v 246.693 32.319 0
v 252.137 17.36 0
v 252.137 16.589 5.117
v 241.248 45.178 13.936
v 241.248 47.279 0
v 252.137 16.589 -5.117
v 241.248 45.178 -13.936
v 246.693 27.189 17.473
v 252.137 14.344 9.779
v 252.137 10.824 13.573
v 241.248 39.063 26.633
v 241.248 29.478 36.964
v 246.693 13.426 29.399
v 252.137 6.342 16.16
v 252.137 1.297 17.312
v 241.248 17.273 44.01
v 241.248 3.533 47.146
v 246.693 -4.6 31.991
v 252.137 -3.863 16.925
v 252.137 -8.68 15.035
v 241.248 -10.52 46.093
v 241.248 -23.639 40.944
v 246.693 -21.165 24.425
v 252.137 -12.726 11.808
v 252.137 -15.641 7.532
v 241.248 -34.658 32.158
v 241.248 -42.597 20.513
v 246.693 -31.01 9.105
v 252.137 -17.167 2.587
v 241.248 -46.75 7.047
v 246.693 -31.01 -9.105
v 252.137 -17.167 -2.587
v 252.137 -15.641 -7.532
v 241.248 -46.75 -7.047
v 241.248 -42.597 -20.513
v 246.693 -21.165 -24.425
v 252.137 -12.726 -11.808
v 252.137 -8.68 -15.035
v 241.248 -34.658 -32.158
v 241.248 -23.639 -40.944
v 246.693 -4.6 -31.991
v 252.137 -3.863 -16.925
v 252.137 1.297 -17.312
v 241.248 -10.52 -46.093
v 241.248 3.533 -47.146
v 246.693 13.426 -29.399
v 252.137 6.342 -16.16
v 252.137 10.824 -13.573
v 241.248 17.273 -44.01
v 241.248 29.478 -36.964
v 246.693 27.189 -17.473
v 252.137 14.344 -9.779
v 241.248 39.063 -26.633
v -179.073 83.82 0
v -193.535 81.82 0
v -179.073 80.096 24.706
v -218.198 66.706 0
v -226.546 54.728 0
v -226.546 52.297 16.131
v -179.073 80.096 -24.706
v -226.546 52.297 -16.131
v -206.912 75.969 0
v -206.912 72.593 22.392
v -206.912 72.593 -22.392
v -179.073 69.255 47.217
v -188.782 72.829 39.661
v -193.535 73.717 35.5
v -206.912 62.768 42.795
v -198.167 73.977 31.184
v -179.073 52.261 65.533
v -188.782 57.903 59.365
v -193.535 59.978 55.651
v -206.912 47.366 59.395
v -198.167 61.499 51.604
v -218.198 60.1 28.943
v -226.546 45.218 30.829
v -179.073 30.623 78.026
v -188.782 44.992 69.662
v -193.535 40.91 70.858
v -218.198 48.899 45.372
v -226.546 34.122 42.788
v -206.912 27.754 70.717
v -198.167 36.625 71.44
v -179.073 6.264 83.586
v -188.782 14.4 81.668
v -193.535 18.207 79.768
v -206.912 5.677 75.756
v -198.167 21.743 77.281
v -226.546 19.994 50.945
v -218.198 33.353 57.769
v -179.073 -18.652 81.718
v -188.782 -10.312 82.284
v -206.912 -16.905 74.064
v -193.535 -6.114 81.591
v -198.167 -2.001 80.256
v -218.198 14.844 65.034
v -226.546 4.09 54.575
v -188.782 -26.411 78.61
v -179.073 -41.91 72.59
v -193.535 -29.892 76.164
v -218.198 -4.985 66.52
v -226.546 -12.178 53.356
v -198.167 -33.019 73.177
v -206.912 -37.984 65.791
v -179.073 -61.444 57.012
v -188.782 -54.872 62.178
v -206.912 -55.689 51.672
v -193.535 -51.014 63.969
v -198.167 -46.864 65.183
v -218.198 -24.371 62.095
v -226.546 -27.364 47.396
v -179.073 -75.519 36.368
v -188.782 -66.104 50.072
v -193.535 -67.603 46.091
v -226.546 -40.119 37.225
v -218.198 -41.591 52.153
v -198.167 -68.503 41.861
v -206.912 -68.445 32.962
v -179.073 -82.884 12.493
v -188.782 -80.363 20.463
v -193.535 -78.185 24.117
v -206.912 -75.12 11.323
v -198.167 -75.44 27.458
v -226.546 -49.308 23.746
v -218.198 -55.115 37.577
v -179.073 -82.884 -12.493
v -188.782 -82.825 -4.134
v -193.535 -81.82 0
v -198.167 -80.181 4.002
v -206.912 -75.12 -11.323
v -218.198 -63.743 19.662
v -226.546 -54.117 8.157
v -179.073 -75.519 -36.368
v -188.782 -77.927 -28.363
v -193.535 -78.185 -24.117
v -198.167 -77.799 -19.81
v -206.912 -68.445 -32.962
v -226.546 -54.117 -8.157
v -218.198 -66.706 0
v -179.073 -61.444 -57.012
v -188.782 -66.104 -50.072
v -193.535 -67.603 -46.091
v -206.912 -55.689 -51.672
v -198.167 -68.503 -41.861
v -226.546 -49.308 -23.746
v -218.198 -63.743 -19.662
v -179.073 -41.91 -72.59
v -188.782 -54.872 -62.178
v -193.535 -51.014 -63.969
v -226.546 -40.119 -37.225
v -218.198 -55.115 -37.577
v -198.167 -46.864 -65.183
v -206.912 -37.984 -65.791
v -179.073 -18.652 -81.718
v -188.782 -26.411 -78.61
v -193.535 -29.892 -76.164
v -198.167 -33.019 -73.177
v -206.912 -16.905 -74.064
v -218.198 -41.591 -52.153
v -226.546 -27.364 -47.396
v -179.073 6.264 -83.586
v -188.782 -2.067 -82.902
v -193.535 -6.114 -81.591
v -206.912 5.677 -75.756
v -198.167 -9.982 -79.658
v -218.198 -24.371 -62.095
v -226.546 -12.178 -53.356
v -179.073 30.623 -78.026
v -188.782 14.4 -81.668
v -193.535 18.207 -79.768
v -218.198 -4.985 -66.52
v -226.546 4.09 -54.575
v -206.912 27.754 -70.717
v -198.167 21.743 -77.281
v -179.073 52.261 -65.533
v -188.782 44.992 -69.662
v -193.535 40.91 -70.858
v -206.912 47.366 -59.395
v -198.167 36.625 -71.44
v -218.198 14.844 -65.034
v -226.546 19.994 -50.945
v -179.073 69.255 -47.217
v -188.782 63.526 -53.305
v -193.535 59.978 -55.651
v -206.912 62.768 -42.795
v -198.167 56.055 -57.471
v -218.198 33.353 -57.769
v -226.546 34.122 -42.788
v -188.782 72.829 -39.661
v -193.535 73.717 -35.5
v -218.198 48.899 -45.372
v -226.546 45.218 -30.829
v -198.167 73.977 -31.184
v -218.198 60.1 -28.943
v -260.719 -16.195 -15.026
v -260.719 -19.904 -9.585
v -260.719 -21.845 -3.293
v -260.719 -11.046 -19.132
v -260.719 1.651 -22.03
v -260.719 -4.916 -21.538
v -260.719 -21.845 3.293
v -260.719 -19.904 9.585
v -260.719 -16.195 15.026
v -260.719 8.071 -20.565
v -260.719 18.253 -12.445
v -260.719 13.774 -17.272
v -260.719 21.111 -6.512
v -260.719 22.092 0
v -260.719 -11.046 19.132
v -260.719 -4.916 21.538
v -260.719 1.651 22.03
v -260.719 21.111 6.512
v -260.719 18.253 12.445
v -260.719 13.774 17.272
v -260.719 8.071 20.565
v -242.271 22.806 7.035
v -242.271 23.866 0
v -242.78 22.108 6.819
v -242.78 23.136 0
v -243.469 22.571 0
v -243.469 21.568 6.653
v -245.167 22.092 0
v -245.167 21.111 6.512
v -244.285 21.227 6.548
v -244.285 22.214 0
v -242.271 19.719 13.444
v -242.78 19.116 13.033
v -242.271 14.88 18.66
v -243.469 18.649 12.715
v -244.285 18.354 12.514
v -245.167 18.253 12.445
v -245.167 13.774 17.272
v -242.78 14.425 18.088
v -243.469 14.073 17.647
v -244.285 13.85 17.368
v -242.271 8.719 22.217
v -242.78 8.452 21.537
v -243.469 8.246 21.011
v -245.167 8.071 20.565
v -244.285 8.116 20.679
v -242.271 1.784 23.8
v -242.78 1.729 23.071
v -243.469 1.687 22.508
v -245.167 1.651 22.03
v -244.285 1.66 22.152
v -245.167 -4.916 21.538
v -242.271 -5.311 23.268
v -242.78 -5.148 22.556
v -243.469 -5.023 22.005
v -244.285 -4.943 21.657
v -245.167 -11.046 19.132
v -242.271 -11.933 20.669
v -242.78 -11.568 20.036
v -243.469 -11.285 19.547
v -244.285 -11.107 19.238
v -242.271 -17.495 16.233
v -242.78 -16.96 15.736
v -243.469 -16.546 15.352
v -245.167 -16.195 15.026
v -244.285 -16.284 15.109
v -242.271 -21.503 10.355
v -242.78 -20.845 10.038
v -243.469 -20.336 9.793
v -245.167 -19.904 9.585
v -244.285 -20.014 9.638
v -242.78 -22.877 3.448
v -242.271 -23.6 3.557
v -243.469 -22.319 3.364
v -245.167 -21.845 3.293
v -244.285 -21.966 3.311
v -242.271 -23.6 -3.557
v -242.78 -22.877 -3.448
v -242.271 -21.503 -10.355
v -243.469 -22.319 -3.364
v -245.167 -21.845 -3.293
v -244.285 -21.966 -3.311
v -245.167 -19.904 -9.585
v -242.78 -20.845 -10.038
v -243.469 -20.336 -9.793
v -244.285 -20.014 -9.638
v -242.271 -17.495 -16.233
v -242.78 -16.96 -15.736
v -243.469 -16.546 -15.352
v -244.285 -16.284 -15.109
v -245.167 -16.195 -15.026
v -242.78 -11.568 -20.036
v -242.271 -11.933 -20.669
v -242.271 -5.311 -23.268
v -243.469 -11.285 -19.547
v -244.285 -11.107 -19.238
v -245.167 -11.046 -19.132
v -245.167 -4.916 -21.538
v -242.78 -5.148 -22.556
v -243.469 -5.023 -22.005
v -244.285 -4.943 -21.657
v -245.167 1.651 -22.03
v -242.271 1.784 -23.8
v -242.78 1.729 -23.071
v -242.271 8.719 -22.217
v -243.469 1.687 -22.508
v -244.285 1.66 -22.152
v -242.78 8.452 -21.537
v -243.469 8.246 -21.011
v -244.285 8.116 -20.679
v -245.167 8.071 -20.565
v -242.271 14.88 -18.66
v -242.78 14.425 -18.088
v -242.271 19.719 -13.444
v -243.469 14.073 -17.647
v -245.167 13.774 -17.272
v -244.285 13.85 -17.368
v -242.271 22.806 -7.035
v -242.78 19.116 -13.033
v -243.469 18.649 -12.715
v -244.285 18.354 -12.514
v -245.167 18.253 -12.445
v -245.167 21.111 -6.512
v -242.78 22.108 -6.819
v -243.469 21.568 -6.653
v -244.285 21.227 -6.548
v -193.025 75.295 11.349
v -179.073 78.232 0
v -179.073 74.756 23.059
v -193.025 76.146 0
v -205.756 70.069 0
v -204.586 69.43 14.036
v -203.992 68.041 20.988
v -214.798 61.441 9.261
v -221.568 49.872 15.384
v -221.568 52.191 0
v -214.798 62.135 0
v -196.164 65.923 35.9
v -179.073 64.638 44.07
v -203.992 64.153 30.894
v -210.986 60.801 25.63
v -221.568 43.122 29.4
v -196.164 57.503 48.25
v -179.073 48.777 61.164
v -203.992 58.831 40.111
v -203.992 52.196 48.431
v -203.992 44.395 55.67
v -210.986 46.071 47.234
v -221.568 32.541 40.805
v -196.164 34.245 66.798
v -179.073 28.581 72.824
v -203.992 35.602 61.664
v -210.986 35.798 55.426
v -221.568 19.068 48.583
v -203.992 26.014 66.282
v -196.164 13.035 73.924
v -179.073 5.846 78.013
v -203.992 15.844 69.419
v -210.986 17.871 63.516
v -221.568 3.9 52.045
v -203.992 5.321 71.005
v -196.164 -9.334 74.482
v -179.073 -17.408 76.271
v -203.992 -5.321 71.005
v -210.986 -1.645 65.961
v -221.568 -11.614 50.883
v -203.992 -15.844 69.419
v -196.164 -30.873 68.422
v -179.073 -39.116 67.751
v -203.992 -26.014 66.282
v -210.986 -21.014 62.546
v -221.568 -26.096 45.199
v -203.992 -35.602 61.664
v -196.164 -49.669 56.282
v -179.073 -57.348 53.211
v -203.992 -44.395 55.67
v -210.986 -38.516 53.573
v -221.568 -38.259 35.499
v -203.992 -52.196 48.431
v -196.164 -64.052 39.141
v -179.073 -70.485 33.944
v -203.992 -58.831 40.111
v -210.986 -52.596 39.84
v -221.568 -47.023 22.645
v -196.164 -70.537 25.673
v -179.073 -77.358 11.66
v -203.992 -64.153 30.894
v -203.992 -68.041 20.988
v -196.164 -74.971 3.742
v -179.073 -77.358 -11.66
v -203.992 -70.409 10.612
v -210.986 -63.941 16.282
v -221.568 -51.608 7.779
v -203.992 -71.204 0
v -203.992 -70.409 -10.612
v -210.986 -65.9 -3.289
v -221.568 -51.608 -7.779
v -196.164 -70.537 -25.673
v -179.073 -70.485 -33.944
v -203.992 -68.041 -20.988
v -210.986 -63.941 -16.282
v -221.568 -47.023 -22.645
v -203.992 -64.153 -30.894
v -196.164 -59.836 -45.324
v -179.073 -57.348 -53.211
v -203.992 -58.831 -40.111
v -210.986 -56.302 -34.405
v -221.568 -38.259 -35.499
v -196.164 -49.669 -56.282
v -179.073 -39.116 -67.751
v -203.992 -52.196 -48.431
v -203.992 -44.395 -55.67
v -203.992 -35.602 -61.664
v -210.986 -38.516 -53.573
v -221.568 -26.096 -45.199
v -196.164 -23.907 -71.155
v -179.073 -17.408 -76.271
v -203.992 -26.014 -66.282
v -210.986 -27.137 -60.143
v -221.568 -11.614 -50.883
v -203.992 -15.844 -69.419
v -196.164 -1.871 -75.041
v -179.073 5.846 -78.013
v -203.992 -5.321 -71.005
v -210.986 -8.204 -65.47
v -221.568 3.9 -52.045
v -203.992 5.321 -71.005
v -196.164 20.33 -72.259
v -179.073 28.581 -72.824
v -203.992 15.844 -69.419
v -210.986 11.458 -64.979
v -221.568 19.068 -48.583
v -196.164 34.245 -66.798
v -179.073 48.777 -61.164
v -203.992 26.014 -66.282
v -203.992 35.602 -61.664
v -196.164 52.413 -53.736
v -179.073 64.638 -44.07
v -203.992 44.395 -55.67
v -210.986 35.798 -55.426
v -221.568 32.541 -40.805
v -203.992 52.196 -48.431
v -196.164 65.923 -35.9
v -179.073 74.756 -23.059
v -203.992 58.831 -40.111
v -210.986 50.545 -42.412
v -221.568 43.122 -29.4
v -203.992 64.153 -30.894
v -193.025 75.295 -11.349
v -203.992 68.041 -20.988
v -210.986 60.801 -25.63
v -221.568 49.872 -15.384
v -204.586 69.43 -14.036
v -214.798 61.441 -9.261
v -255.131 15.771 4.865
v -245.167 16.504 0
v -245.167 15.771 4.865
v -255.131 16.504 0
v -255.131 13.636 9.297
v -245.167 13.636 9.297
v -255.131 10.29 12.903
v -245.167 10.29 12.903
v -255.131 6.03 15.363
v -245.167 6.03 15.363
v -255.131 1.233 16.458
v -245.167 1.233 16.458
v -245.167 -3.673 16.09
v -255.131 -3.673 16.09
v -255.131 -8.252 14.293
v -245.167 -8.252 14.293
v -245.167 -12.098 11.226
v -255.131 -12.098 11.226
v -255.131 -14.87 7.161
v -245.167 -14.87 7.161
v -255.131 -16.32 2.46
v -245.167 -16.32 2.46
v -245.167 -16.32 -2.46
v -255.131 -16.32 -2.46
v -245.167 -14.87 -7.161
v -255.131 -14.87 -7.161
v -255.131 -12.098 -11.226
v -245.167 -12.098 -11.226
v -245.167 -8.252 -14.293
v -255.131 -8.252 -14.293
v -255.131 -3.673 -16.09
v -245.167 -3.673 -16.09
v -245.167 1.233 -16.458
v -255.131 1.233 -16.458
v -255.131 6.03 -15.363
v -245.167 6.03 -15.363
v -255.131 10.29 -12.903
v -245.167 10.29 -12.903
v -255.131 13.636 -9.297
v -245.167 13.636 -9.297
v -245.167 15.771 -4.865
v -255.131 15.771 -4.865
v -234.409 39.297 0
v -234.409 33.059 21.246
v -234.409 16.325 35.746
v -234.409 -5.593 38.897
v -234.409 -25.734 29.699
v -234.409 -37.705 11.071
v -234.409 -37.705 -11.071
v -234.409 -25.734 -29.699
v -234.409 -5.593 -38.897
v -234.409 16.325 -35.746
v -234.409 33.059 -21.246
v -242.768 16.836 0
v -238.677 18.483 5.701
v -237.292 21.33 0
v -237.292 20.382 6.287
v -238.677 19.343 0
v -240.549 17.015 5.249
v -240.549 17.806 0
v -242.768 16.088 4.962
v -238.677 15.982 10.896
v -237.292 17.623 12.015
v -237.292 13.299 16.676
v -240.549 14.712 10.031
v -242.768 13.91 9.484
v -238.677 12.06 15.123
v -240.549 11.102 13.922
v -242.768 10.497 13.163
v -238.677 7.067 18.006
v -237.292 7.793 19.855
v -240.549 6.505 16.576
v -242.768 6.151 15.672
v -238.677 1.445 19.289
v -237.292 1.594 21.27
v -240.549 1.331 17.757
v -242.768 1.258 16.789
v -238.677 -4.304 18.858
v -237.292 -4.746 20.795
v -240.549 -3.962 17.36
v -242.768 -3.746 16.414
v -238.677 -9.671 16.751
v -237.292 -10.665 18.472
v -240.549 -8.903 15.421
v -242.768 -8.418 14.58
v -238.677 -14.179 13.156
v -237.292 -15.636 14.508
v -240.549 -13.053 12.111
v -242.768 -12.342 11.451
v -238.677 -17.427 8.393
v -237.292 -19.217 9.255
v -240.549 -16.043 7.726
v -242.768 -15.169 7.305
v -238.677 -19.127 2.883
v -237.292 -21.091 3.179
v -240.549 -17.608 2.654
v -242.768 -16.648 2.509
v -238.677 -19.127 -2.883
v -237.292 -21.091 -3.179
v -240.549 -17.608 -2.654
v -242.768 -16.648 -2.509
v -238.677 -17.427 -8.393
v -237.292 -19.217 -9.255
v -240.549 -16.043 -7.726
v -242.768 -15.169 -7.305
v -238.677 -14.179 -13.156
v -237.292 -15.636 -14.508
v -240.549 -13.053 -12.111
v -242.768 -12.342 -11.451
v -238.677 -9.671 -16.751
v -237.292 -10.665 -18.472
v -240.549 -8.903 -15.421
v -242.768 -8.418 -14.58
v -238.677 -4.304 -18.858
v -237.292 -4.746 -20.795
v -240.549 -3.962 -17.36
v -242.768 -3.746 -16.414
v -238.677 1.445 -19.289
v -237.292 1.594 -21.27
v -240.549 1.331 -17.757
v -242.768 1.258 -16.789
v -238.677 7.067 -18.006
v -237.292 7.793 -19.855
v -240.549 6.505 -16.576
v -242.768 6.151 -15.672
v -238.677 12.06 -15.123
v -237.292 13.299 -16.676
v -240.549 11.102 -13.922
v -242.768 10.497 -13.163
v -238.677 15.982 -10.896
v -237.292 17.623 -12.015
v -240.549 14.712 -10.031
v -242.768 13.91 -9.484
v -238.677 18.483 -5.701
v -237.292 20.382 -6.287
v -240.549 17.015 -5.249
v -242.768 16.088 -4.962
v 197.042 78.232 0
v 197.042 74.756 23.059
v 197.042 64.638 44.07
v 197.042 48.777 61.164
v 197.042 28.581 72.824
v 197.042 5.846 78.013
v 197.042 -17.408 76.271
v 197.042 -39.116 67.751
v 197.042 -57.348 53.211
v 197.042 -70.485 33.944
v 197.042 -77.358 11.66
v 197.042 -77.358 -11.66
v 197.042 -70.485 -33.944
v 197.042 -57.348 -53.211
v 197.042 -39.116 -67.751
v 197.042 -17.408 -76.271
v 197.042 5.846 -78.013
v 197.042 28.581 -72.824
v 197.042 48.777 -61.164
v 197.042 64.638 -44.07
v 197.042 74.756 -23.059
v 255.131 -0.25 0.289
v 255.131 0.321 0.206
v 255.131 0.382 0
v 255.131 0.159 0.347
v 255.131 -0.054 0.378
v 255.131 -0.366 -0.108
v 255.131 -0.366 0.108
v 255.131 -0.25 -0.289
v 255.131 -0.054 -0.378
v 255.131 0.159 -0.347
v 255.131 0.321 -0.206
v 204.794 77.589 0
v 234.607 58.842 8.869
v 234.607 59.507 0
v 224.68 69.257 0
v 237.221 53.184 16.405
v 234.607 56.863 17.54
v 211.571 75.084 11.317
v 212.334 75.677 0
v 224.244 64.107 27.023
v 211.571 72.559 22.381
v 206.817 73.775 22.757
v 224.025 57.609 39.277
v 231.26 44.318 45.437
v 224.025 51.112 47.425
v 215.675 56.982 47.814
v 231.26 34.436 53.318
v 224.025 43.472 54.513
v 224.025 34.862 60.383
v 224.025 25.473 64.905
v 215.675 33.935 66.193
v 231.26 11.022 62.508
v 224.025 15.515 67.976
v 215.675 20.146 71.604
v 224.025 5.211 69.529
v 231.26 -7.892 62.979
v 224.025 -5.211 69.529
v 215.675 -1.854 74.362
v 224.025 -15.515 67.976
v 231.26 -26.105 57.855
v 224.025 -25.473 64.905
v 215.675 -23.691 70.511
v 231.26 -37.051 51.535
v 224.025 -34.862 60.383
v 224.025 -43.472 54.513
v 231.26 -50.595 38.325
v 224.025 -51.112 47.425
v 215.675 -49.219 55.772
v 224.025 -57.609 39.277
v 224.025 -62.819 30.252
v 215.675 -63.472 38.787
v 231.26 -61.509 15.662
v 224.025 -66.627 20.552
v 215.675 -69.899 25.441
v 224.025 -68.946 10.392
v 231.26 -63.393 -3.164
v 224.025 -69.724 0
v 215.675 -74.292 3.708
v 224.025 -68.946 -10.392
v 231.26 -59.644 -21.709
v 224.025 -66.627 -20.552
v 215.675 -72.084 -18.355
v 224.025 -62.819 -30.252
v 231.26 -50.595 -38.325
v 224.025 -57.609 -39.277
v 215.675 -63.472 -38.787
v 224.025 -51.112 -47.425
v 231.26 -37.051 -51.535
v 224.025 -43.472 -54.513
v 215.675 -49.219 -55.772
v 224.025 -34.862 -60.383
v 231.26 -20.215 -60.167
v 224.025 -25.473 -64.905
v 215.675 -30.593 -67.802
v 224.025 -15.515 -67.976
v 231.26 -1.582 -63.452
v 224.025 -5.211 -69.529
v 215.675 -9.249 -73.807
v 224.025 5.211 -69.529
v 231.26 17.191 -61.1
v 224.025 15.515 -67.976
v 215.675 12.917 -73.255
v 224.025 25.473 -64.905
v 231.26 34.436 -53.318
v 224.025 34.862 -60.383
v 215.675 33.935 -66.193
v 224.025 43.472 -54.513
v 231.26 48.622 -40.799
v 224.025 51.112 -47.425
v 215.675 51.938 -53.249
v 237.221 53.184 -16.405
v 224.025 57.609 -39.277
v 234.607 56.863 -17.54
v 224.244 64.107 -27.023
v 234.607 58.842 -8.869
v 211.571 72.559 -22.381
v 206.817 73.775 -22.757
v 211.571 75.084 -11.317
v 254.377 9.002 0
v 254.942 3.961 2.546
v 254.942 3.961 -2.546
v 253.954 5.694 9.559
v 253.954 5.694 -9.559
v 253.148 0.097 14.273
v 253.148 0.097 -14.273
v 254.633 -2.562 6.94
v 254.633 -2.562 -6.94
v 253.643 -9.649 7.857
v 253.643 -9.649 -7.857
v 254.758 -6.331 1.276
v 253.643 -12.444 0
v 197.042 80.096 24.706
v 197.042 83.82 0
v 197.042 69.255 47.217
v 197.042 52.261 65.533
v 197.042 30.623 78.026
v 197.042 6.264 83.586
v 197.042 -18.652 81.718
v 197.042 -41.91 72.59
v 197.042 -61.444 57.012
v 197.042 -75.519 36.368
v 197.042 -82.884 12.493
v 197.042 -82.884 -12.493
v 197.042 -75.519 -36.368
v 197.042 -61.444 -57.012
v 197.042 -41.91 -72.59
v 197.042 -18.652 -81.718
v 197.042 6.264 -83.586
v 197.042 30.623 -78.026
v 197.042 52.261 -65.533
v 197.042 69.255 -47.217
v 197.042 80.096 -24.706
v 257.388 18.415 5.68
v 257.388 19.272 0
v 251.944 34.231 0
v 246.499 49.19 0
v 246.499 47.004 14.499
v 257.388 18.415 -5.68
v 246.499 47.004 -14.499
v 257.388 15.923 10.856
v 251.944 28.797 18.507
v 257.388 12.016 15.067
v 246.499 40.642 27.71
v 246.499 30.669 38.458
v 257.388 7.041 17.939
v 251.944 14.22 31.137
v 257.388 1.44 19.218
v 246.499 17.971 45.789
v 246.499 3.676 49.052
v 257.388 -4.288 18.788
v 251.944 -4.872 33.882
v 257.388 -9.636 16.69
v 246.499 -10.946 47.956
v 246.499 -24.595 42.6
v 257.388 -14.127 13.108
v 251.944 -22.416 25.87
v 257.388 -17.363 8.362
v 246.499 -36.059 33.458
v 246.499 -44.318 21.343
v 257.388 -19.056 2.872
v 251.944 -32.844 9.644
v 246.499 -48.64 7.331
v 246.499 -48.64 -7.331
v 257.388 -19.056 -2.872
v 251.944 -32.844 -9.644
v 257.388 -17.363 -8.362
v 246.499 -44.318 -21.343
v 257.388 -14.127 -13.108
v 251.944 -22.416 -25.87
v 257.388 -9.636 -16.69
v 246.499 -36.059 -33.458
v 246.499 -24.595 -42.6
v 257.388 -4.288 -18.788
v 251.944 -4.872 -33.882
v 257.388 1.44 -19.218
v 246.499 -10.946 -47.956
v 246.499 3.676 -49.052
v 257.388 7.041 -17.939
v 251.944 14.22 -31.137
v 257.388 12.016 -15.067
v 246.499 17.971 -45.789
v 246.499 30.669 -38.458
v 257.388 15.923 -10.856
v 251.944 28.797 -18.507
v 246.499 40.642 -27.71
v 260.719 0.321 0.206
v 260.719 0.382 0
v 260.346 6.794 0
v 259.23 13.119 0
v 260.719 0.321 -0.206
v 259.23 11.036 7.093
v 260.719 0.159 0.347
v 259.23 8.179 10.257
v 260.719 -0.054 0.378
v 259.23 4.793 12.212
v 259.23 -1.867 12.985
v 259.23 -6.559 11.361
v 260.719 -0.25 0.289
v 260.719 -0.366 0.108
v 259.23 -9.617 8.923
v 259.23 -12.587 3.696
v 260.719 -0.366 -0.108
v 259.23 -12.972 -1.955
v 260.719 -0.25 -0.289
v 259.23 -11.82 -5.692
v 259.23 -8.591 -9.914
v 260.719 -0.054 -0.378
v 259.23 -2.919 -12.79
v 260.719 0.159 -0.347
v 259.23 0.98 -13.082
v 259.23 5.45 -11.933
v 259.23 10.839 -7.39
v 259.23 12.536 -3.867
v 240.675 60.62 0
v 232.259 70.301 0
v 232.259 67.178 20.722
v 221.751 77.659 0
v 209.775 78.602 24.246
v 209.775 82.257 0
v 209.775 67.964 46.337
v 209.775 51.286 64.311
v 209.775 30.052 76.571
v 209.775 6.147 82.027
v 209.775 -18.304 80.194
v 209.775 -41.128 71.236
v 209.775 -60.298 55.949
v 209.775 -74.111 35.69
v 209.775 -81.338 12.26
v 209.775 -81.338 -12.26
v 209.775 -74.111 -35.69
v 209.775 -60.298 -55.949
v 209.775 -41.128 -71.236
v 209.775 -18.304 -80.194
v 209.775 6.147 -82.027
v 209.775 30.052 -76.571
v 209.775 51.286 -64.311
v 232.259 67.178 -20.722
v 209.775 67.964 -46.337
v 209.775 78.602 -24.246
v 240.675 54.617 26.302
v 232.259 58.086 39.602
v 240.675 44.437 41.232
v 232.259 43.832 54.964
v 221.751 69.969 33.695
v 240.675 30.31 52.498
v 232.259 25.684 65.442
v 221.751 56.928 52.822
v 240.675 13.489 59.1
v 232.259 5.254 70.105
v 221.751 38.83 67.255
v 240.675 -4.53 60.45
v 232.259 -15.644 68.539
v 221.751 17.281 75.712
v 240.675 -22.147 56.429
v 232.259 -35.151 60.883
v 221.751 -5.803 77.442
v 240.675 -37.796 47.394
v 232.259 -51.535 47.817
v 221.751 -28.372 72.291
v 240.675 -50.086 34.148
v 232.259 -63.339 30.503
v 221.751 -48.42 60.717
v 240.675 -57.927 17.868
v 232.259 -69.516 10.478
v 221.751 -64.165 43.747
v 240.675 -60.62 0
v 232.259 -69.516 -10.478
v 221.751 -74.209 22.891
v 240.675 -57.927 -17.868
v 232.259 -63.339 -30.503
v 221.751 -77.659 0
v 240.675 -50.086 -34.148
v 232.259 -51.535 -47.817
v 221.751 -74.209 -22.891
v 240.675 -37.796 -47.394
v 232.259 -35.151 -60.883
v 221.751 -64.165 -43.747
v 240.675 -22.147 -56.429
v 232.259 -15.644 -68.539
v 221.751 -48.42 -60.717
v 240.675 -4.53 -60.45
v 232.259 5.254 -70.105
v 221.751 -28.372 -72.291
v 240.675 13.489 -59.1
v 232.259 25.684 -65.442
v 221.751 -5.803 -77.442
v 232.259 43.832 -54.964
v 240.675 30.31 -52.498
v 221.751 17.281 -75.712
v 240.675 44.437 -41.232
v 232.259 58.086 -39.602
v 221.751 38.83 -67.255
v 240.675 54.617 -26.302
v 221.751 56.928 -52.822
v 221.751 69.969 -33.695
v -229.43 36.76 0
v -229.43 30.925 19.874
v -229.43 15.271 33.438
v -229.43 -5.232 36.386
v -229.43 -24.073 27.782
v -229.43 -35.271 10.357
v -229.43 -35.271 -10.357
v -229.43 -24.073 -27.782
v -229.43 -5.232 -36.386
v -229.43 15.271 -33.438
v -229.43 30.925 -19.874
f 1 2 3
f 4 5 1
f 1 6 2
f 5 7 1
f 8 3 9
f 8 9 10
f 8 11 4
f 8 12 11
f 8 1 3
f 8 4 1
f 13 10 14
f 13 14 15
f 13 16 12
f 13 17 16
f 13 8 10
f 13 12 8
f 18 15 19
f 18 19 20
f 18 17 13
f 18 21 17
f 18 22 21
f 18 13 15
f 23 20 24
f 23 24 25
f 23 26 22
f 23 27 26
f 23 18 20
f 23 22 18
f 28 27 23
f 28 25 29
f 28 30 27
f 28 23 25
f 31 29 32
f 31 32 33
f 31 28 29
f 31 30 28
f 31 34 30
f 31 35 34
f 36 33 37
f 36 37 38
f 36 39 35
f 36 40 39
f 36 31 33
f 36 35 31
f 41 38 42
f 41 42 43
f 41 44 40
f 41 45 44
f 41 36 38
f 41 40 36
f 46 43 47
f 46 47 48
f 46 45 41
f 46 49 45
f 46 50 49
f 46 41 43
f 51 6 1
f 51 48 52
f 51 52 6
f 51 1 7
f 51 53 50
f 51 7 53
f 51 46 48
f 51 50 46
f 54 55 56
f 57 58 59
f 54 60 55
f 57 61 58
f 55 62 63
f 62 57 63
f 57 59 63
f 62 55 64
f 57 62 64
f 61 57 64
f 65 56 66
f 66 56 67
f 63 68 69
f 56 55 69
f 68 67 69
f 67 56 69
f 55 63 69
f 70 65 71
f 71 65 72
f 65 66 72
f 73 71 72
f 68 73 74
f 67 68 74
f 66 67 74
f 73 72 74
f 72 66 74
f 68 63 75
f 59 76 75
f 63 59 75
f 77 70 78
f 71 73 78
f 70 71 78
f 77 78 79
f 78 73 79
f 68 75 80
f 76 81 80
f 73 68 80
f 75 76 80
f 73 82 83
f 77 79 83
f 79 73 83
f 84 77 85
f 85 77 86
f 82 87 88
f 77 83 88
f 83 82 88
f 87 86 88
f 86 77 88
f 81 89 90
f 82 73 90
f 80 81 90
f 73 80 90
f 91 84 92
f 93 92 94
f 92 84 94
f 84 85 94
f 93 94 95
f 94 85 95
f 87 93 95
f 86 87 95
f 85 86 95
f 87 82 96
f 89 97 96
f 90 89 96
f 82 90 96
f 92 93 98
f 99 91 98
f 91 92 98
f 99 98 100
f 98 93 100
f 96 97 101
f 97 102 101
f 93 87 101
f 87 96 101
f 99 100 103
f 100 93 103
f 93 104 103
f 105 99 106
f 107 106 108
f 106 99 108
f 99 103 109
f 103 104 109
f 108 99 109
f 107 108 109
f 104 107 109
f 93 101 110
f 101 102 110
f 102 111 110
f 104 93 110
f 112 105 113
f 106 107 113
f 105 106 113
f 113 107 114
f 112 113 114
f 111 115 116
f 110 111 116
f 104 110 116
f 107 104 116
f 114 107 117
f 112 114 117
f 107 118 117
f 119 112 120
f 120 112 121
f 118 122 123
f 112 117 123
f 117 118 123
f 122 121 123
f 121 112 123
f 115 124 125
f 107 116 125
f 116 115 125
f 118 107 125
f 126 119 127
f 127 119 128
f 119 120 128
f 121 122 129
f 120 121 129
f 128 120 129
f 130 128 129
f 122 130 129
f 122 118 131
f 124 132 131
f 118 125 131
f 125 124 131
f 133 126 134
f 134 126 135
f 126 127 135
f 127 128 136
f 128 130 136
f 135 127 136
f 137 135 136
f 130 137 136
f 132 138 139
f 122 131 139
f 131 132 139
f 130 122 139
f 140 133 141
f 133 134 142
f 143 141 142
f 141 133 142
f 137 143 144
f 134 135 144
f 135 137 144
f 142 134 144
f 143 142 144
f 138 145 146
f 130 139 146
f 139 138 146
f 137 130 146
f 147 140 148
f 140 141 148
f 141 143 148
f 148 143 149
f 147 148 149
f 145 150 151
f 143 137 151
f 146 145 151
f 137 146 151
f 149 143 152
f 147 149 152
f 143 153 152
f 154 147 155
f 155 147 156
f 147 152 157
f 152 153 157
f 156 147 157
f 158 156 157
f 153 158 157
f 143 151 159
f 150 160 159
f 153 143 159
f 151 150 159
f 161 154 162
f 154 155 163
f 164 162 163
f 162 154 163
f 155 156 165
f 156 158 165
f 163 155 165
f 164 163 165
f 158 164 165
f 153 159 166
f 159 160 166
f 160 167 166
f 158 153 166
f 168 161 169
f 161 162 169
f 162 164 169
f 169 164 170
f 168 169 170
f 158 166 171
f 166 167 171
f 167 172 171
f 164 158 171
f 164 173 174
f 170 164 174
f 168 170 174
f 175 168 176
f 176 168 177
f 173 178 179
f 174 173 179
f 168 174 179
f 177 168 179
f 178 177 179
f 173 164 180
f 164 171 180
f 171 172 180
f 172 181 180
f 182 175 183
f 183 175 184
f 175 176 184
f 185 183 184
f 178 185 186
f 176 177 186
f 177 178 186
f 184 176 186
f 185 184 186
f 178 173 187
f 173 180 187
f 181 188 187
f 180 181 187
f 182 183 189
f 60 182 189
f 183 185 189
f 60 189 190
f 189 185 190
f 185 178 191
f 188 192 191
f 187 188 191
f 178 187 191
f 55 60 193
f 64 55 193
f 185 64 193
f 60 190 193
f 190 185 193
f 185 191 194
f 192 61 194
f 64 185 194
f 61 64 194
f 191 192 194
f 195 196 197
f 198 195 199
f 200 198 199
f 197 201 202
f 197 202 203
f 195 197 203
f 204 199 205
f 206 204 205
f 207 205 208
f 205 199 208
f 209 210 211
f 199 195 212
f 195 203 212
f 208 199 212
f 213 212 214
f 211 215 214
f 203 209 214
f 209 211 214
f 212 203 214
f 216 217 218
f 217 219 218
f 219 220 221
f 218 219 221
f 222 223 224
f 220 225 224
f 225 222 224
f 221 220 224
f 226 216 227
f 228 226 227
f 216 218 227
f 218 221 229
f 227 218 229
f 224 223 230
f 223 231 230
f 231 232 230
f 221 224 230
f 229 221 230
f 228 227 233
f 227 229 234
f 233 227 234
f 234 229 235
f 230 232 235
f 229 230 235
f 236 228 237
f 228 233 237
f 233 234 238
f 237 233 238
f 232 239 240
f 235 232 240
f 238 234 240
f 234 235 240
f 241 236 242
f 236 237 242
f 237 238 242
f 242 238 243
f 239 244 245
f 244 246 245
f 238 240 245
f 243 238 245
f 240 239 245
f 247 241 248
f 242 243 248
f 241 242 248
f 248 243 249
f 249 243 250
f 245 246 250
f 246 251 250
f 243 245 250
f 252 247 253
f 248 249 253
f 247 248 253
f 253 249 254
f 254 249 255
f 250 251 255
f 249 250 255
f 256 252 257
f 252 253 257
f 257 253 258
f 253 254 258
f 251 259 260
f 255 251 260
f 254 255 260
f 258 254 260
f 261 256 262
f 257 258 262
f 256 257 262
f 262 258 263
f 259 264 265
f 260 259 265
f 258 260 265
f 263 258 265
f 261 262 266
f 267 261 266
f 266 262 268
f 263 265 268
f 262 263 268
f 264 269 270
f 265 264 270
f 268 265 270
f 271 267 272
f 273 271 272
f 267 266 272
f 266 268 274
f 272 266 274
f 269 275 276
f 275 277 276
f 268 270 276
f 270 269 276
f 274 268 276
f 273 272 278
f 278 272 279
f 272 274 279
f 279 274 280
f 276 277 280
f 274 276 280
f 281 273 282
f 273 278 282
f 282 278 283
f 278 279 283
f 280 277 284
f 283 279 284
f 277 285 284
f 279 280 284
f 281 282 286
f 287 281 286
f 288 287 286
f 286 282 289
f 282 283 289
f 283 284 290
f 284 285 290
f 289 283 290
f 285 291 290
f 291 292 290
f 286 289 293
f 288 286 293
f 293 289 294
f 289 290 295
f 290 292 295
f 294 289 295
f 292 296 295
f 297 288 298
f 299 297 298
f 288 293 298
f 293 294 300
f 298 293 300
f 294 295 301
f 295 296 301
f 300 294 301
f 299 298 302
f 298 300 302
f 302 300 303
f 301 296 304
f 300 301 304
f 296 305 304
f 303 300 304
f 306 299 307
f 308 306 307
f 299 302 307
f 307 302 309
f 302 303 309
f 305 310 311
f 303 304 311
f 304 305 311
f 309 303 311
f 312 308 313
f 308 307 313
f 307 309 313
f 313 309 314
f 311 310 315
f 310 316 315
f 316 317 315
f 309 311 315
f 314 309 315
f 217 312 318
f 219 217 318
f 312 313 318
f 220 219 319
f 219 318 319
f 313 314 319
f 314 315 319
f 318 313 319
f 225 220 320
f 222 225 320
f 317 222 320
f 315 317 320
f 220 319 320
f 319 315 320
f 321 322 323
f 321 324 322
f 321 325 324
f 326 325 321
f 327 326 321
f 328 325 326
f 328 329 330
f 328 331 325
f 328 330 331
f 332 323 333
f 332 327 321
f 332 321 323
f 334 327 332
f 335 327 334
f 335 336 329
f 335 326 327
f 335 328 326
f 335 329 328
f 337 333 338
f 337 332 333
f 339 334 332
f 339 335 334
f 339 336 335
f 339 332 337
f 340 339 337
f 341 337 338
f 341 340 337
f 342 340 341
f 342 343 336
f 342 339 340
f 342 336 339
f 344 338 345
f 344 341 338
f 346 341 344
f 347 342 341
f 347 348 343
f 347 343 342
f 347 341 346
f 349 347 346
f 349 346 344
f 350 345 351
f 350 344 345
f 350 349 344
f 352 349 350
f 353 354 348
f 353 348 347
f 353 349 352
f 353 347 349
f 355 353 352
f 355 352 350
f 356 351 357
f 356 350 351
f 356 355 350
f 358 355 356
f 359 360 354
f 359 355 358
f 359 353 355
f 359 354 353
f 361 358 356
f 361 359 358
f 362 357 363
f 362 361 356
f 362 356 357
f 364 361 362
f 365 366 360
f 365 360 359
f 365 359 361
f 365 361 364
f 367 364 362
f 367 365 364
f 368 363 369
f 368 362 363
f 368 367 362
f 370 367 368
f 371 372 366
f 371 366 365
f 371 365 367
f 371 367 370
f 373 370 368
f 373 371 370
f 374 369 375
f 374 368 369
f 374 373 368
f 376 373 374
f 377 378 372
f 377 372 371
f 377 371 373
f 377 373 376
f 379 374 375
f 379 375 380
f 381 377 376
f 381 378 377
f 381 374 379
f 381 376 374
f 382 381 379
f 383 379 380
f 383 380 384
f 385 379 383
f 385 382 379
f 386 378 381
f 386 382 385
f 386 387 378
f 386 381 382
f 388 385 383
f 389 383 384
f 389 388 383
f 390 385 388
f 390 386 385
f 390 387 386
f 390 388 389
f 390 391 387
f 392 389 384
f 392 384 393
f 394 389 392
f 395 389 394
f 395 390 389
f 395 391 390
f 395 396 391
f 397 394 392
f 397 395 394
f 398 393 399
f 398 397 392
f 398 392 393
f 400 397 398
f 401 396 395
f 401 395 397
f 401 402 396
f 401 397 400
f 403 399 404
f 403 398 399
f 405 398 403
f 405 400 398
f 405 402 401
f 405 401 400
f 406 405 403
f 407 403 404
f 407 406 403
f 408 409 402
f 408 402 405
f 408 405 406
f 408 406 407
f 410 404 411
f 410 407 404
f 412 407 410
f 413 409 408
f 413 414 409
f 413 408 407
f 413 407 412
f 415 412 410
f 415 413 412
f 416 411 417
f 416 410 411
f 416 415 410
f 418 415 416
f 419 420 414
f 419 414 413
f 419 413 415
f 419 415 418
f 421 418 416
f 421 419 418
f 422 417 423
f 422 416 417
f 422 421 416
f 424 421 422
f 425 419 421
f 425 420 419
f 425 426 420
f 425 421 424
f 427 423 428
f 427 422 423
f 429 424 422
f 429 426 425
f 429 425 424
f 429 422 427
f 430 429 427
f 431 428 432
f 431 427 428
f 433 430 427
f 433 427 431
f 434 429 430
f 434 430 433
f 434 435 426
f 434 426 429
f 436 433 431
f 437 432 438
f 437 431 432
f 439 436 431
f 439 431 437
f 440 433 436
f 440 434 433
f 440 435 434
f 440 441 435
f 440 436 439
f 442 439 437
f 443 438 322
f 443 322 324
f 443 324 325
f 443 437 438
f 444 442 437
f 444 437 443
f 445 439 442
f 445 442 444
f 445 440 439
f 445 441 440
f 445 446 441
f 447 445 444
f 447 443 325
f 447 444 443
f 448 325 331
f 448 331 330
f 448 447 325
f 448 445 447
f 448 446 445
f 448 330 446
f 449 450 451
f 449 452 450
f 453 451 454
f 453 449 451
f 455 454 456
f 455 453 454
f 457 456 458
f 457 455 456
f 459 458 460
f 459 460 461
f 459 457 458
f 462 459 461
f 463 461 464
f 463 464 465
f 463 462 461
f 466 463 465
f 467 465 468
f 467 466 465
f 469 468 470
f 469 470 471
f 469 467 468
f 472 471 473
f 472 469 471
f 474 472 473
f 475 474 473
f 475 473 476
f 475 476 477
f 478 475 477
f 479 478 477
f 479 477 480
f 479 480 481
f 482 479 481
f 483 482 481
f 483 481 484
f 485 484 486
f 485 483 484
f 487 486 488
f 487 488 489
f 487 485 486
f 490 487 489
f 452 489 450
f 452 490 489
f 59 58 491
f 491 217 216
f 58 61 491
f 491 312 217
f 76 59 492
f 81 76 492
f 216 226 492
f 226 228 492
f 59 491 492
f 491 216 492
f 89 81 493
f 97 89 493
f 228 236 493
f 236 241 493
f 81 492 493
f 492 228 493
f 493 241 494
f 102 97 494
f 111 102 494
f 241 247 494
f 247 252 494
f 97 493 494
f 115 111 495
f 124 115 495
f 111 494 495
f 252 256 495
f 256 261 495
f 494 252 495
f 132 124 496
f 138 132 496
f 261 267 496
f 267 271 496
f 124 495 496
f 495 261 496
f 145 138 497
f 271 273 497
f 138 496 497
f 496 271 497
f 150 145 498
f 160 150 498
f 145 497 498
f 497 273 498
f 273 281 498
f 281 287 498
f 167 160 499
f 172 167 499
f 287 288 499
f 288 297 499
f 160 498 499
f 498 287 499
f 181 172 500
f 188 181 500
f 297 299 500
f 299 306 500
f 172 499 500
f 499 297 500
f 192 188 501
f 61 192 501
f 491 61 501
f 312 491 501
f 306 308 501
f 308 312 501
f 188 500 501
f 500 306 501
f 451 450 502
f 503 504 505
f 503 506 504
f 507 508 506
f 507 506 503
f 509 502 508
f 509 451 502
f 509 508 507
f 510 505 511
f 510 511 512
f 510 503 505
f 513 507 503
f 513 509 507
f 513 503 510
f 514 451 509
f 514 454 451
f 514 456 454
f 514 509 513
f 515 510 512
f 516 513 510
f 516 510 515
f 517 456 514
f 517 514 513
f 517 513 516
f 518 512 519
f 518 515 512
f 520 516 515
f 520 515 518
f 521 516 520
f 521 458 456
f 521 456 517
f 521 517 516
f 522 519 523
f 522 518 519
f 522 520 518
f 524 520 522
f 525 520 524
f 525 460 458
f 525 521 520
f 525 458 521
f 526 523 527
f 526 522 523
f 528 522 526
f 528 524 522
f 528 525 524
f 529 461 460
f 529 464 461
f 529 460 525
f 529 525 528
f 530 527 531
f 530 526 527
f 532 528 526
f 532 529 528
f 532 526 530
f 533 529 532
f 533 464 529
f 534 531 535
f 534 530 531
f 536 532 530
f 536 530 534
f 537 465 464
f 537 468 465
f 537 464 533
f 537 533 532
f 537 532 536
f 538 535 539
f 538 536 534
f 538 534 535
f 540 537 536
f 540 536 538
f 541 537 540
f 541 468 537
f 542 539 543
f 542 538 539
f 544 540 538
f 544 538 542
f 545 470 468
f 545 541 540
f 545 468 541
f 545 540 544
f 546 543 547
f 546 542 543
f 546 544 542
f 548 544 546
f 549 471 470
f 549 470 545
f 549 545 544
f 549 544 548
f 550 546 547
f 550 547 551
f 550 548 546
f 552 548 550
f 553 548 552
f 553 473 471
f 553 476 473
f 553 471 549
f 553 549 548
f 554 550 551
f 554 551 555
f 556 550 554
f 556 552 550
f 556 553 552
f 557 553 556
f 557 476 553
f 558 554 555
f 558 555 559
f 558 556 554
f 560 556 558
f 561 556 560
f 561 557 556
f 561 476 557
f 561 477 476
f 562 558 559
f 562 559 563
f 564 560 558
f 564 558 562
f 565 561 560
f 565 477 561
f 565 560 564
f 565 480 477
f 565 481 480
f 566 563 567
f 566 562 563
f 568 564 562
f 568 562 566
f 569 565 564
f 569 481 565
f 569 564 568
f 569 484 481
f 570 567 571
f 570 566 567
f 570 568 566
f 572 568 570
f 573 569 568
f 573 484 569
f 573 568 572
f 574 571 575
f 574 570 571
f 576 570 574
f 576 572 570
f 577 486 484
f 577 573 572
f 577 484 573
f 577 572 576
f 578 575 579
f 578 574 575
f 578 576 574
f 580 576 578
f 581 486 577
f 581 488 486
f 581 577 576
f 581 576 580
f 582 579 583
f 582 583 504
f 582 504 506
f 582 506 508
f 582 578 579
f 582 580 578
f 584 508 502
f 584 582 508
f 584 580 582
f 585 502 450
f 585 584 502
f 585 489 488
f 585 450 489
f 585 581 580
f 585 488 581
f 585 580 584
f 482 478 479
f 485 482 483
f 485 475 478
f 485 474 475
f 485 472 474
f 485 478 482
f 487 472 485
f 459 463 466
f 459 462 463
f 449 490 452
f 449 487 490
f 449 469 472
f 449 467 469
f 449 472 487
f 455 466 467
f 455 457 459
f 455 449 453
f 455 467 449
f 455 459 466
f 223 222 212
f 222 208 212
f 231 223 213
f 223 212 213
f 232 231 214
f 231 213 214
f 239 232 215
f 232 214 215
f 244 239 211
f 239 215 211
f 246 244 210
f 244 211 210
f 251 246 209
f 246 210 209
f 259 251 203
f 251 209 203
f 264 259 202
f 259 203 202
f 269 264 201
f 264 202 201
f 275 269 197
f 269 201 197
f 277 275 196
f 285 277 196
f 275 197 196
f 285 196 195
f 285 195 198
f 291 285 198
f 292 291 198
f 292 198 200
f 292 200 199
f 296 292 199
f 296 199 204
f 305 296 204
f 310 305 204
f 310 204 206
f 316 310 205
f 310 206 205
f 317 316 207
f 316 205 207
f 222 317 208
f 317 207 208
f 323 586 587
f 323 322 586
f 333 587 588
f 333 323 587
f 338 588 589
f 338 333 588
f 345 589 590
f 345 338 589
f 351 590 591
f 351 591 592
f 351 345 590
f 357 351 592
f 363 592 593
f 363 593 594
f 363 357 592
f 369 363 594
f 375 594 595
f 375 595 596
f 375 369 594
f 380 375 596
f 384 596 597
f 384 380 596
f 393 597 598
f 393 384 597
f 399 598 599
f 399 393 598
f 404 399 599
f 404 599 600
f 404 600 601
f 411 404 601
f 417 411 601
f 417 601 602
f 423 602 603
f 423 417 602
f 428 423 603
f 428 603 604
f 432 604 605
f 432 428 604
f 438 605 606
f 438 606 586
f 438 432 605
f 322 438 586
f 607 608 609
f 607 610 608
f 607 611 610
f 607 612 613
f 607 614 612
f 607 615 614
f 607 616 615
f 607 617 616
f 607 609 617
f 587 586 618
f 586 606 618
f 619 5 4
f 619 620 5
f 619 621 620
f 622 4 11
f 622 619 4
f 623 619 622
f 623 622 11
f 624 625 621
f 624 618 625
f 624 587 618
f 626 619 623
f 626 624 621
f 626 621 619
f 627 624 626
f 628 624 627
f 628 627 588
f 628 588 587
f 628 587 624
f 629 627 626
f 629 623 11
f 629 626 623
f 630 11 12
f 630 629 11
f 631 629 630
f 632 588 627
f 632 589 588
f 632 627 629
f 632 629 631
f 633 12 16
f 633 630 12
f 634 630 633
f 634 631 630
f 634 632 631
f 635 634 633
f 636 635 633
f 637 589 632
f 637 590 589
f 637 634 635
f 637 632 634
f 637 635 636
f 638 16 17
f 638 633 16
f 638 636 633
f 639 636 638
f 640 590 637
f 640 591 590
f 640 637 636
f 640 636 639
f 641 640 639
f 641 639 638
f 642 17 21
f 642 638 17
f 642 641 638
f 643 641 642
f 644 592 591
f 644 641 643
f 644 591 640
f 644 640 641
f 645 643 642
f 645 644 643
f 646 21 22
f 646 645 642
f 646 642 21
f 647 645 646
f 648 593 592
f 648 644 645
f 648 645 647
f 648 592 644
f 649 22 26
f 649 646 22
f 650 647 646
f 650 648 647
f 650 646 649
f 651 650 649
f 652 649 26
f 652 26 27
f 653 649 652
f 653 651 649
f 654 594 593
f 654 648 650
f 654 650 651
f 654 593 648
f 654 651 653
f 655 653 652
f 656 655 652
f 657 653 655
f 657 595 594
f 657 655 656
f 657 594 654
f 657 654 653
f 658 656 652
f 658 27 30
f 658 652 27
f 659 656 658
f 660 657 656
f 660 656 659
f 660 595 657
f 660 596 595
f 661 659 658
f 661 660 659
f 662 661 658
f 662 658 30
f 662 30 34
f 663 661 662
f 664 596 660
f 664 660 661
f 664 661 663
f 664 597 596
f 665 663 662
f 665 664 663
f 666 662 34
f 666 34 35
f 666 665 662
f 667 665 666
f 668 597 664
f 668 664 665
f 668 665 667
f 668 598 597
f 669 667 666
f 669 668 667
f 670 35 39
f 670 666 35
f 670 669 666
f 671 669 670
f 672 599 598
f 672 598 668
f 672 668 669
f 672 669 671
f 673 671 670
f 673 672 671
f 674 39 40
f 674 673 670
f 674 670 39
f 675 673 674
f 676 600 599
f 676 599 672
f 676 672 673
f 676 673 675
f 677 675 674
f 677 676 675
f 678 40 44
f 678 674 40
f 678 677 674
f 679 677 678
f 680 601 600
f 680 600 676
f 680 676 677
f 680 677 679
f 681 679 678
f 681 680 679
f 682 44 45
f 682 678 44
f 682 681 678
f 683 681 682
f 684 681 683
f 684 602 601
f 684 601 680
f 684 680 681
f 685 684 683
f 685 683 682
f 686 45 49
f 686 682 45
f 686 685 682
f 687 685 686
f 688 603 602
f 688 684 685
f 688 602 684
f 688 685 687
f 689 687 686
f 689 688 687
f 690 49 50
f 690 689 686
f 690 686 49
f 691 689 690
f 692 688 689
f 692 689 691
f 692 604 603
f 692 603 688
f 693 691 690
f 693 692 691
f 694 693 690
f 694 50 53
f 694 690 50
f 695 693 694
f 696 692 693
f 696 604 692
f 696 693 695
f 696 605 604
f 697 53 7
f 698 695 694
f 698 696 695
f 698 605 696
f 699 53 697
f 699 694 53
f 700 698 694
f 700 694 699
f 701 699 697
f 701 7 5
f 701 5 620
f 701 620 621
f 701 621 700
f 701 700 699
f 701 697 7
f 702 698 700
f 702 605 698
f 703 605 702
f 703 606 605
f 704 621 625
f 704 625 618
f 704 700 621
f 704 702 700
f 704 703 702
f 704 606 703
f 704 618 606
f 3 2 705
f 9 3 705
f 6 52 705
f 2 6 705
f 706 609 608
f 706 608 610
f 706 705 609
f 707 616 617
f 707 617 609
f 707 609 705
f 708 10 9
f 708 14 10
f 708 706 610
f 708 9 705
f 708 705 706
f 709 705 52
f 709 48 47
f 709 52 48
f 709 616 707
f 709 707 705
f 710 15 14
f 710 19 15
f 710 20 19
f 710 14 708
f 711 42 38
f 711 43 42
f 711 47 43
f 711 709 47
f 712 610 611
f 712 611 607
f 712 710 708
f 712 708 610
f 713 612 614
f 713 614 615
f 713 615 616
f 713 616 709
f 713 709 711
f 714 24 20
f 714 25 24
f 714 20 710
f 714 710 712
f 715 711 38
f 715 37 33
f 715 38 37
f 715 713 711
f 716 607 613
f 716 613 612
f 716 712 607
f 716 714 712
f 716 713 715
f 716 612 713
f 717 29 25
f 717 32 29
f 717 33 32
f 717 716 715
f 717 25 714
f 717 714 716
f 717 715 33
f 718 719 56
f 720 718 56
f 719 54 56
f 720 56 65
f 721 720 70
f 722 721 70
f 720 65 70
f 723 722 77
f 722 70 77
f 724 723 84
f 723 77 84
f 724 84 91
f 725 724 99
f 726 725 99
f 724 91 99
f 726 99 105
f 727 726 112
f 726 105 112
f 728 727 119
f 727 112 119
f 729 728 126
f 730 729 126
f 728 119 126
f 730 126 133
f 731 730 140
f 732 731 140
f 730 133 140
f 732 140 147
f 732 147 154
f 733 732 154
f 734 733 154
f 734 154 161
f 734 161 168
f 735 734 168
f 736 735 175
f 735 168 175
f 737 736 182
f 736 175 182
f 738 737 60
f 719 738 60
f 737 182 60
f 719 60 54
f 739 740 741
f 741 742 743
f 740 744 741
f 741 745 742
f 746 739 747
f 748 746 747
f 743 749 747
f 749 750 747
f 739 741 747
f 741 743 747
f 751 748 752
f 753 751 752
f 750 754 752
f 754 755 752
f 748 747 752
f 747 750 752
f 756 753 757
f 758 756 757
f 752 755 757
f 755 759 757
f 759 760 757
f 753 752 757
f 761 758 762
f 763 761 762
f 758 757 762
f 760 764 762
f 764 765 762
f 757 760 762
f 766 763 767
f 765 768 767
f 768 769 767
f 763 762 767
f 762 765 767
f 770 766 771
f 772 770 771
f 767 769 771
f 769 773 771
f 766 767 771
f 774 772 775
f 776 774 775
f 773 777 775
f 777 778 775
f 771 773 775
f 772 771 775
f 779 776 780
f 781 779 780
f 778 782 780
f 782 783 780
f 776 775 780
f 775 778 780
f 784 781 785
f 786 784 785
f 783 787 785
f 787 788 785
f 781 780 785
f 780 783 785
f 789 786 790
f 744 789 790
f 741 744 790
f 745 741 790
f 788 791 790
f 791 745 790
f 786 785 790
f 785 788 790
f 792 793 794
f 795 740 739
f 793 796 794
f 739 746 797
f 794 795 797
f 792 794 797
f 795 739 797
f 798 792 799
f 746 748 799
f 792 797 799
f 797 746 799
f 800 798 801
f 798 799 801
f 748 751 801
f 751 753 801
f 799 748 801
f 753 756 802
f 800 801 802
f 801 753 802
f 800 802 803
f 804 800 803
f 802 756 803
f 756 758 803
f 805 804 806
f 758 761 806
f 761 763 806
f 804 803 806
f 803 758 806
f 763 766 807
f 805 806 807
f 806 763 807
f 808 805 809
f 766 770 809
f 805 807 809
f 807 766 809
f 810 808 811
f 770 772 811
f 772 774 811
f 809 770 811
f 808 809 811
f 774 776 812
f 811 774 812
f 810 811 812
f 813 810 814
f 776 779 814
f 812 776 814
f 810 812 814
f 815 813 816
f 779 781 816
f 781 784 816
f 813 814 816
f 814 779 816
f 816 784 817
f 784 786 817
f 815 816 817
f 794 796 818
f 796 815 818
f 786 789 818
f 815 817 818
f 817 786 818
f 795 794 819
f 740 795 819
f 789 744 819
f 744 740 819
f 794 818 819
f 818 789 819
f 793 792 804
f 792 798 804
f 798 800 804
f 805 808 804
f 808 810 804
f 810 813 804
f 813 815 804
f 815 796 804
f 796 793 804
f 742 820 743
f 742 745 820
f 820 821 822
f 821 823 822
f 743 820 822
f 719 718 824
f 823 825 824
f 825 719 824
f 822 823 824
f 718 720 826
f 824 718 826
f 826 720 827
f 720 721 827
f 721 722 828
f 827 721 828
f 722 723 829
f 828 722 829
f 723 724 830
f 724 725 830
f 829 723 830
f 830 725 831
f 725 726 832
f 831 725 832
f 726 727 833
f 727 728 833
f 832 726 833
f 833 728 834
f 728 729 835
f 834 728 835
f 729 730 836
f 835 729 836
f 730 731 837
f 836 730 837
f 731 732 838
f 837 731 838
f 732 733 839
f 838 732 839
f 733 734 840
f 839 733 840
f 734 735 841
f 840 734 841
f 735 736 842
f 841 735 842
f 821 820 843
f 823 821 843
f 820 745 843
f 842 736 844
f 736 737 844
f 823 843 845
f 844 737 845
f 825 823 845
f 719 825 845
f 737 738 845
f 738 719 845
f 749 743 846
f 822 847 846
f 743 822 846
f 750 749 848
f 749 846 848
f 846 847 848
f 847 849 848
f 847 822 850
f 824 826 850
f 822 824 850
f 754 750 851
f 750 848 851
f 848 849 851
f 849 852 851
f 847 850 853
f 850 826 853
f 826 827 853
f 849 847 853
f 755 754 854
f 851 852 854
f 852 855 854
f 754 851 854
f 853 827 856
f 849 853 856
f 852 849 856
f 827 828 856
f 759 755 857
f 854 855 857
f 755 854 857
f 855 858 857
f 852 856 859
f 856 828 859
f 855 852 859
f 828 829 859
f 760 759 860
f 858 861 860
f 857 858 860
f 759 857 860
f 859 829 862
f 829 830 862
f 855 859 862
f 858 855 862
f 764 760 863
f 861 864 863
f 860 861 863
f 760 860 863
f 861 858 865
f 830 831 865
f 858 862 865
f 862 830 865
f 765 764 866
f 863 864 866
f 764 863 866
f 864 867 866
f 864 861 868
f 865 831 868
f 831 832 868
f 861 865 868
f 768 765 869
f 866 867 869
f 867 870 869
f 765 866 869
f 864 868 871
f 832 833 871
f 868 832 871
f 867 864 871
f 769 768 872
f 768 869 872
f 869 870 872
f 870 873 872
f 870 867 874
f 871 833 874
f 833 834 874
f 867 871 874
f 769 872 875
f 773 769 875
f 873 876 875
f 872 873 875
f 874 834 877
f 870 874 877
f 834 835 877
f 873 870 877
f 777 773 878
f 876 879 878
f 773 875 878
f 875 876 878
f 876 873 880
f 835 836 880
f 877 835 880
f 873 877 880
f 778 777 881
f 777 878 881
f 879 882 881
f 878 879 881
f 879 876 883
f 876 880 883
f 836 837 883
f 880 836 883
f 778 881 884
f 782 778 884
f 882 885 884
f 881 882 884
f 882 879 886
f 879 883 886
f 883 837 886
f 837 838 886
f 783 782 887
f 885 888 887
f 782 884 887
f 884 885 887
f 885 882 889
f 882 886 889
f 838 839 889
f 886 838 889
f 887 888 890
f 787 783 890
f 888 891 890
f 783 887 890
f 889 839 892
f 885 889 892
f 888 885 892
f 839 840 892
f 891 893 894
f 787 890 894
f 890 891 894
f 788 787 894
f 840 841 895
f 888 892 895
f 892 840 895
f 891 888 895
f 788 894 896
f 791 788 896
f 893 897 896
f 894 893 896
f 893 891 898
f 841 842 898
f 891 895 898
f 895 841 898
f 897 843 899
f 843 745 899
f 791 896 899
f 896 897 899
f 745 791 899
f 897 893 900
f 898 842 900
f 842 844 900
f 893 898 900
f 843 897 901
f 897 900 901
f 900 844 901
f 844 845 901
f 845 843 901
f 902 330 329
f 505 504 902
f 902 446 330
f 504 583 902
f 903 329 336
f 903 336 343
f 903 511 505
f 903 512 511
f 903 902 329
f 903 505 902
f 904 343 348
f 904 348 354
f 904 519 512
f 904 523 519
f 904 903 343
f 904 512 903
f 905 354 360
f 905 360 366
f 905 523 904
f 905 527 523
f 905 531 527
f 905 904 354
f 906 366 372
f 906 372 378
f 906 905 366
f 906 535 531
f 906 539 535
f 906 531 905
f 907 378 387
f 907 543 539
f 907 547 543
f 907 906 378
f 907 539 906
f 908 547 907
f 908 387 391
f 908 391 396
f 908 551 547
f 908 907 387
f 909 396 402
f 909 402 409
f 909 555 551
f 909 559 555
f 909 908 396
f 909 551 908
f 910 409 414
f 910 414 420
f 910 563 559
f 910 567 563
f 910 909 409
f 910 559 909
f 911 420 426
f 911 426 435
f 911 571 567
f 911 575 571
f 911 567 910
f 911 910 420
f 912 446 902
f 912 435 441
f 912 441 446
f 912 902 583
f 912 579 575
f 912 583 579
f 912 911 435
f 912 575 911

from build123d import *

# Parameters (mm, degrees)
SCALE1_SCALE = 649.76746201
SHELL2_T     = 5.588


with BuildPart() as part:
    # Sketch1 → Revolve2 (revolve)
    with BuildSketch(Plane.XY):
        with BuildLine():
            Line((0.30325, 0.129), (-0.275595218, 0.129))
            ThreePointArc((-0.275595218, 0.129), (-0.3184401, 0.116916493), (-0.348657753, 0.084227221))
            Line((-0.348657753, 0.084227221), (-0.372858421, 0.036730735))
            ThreePointArc((-0.372858421, 0.036730735), (-0.374701425, 0.034736985), (-0.377314576, 0.034))
            Line((-0.377314576, 0.034), (-0.40125, 0.034))
            Line((-0.40125, 0.034), (-0.40125, 0))
            Line((-0.40125, 0), (0.40125, 0))
            Line((0.40125, 0), (0.40125, 0.000587576))
            ThreePointArc((0.40125, 0.000587576), (0.399958659, 0.015347671), (0.396123873, 0.029659288))
            Line((0.396123873, 0.029659288), (0.379365102, 0.075703632))
            ThreePointArc((0.379365102, 0.075703632), (0.349709691, 0.114351316), (0.30325, 0.129))
        make_face()
    revolve(axis=Axis((-0.40125, 0, 0), (1, 0, 0)))


with BuildPart() as part_1:
    # Scale1: scaled about (0, 0, 0)
    add(part.part.scale(SCALE1_SCALE))

    # Shell2 (no face opened: a closed hollow body)
    add(offset(amount=-SHELL2_T, mode=Mode.PRIVATE), mode=Mode.SUBTRACT)


solid = part_1.part
